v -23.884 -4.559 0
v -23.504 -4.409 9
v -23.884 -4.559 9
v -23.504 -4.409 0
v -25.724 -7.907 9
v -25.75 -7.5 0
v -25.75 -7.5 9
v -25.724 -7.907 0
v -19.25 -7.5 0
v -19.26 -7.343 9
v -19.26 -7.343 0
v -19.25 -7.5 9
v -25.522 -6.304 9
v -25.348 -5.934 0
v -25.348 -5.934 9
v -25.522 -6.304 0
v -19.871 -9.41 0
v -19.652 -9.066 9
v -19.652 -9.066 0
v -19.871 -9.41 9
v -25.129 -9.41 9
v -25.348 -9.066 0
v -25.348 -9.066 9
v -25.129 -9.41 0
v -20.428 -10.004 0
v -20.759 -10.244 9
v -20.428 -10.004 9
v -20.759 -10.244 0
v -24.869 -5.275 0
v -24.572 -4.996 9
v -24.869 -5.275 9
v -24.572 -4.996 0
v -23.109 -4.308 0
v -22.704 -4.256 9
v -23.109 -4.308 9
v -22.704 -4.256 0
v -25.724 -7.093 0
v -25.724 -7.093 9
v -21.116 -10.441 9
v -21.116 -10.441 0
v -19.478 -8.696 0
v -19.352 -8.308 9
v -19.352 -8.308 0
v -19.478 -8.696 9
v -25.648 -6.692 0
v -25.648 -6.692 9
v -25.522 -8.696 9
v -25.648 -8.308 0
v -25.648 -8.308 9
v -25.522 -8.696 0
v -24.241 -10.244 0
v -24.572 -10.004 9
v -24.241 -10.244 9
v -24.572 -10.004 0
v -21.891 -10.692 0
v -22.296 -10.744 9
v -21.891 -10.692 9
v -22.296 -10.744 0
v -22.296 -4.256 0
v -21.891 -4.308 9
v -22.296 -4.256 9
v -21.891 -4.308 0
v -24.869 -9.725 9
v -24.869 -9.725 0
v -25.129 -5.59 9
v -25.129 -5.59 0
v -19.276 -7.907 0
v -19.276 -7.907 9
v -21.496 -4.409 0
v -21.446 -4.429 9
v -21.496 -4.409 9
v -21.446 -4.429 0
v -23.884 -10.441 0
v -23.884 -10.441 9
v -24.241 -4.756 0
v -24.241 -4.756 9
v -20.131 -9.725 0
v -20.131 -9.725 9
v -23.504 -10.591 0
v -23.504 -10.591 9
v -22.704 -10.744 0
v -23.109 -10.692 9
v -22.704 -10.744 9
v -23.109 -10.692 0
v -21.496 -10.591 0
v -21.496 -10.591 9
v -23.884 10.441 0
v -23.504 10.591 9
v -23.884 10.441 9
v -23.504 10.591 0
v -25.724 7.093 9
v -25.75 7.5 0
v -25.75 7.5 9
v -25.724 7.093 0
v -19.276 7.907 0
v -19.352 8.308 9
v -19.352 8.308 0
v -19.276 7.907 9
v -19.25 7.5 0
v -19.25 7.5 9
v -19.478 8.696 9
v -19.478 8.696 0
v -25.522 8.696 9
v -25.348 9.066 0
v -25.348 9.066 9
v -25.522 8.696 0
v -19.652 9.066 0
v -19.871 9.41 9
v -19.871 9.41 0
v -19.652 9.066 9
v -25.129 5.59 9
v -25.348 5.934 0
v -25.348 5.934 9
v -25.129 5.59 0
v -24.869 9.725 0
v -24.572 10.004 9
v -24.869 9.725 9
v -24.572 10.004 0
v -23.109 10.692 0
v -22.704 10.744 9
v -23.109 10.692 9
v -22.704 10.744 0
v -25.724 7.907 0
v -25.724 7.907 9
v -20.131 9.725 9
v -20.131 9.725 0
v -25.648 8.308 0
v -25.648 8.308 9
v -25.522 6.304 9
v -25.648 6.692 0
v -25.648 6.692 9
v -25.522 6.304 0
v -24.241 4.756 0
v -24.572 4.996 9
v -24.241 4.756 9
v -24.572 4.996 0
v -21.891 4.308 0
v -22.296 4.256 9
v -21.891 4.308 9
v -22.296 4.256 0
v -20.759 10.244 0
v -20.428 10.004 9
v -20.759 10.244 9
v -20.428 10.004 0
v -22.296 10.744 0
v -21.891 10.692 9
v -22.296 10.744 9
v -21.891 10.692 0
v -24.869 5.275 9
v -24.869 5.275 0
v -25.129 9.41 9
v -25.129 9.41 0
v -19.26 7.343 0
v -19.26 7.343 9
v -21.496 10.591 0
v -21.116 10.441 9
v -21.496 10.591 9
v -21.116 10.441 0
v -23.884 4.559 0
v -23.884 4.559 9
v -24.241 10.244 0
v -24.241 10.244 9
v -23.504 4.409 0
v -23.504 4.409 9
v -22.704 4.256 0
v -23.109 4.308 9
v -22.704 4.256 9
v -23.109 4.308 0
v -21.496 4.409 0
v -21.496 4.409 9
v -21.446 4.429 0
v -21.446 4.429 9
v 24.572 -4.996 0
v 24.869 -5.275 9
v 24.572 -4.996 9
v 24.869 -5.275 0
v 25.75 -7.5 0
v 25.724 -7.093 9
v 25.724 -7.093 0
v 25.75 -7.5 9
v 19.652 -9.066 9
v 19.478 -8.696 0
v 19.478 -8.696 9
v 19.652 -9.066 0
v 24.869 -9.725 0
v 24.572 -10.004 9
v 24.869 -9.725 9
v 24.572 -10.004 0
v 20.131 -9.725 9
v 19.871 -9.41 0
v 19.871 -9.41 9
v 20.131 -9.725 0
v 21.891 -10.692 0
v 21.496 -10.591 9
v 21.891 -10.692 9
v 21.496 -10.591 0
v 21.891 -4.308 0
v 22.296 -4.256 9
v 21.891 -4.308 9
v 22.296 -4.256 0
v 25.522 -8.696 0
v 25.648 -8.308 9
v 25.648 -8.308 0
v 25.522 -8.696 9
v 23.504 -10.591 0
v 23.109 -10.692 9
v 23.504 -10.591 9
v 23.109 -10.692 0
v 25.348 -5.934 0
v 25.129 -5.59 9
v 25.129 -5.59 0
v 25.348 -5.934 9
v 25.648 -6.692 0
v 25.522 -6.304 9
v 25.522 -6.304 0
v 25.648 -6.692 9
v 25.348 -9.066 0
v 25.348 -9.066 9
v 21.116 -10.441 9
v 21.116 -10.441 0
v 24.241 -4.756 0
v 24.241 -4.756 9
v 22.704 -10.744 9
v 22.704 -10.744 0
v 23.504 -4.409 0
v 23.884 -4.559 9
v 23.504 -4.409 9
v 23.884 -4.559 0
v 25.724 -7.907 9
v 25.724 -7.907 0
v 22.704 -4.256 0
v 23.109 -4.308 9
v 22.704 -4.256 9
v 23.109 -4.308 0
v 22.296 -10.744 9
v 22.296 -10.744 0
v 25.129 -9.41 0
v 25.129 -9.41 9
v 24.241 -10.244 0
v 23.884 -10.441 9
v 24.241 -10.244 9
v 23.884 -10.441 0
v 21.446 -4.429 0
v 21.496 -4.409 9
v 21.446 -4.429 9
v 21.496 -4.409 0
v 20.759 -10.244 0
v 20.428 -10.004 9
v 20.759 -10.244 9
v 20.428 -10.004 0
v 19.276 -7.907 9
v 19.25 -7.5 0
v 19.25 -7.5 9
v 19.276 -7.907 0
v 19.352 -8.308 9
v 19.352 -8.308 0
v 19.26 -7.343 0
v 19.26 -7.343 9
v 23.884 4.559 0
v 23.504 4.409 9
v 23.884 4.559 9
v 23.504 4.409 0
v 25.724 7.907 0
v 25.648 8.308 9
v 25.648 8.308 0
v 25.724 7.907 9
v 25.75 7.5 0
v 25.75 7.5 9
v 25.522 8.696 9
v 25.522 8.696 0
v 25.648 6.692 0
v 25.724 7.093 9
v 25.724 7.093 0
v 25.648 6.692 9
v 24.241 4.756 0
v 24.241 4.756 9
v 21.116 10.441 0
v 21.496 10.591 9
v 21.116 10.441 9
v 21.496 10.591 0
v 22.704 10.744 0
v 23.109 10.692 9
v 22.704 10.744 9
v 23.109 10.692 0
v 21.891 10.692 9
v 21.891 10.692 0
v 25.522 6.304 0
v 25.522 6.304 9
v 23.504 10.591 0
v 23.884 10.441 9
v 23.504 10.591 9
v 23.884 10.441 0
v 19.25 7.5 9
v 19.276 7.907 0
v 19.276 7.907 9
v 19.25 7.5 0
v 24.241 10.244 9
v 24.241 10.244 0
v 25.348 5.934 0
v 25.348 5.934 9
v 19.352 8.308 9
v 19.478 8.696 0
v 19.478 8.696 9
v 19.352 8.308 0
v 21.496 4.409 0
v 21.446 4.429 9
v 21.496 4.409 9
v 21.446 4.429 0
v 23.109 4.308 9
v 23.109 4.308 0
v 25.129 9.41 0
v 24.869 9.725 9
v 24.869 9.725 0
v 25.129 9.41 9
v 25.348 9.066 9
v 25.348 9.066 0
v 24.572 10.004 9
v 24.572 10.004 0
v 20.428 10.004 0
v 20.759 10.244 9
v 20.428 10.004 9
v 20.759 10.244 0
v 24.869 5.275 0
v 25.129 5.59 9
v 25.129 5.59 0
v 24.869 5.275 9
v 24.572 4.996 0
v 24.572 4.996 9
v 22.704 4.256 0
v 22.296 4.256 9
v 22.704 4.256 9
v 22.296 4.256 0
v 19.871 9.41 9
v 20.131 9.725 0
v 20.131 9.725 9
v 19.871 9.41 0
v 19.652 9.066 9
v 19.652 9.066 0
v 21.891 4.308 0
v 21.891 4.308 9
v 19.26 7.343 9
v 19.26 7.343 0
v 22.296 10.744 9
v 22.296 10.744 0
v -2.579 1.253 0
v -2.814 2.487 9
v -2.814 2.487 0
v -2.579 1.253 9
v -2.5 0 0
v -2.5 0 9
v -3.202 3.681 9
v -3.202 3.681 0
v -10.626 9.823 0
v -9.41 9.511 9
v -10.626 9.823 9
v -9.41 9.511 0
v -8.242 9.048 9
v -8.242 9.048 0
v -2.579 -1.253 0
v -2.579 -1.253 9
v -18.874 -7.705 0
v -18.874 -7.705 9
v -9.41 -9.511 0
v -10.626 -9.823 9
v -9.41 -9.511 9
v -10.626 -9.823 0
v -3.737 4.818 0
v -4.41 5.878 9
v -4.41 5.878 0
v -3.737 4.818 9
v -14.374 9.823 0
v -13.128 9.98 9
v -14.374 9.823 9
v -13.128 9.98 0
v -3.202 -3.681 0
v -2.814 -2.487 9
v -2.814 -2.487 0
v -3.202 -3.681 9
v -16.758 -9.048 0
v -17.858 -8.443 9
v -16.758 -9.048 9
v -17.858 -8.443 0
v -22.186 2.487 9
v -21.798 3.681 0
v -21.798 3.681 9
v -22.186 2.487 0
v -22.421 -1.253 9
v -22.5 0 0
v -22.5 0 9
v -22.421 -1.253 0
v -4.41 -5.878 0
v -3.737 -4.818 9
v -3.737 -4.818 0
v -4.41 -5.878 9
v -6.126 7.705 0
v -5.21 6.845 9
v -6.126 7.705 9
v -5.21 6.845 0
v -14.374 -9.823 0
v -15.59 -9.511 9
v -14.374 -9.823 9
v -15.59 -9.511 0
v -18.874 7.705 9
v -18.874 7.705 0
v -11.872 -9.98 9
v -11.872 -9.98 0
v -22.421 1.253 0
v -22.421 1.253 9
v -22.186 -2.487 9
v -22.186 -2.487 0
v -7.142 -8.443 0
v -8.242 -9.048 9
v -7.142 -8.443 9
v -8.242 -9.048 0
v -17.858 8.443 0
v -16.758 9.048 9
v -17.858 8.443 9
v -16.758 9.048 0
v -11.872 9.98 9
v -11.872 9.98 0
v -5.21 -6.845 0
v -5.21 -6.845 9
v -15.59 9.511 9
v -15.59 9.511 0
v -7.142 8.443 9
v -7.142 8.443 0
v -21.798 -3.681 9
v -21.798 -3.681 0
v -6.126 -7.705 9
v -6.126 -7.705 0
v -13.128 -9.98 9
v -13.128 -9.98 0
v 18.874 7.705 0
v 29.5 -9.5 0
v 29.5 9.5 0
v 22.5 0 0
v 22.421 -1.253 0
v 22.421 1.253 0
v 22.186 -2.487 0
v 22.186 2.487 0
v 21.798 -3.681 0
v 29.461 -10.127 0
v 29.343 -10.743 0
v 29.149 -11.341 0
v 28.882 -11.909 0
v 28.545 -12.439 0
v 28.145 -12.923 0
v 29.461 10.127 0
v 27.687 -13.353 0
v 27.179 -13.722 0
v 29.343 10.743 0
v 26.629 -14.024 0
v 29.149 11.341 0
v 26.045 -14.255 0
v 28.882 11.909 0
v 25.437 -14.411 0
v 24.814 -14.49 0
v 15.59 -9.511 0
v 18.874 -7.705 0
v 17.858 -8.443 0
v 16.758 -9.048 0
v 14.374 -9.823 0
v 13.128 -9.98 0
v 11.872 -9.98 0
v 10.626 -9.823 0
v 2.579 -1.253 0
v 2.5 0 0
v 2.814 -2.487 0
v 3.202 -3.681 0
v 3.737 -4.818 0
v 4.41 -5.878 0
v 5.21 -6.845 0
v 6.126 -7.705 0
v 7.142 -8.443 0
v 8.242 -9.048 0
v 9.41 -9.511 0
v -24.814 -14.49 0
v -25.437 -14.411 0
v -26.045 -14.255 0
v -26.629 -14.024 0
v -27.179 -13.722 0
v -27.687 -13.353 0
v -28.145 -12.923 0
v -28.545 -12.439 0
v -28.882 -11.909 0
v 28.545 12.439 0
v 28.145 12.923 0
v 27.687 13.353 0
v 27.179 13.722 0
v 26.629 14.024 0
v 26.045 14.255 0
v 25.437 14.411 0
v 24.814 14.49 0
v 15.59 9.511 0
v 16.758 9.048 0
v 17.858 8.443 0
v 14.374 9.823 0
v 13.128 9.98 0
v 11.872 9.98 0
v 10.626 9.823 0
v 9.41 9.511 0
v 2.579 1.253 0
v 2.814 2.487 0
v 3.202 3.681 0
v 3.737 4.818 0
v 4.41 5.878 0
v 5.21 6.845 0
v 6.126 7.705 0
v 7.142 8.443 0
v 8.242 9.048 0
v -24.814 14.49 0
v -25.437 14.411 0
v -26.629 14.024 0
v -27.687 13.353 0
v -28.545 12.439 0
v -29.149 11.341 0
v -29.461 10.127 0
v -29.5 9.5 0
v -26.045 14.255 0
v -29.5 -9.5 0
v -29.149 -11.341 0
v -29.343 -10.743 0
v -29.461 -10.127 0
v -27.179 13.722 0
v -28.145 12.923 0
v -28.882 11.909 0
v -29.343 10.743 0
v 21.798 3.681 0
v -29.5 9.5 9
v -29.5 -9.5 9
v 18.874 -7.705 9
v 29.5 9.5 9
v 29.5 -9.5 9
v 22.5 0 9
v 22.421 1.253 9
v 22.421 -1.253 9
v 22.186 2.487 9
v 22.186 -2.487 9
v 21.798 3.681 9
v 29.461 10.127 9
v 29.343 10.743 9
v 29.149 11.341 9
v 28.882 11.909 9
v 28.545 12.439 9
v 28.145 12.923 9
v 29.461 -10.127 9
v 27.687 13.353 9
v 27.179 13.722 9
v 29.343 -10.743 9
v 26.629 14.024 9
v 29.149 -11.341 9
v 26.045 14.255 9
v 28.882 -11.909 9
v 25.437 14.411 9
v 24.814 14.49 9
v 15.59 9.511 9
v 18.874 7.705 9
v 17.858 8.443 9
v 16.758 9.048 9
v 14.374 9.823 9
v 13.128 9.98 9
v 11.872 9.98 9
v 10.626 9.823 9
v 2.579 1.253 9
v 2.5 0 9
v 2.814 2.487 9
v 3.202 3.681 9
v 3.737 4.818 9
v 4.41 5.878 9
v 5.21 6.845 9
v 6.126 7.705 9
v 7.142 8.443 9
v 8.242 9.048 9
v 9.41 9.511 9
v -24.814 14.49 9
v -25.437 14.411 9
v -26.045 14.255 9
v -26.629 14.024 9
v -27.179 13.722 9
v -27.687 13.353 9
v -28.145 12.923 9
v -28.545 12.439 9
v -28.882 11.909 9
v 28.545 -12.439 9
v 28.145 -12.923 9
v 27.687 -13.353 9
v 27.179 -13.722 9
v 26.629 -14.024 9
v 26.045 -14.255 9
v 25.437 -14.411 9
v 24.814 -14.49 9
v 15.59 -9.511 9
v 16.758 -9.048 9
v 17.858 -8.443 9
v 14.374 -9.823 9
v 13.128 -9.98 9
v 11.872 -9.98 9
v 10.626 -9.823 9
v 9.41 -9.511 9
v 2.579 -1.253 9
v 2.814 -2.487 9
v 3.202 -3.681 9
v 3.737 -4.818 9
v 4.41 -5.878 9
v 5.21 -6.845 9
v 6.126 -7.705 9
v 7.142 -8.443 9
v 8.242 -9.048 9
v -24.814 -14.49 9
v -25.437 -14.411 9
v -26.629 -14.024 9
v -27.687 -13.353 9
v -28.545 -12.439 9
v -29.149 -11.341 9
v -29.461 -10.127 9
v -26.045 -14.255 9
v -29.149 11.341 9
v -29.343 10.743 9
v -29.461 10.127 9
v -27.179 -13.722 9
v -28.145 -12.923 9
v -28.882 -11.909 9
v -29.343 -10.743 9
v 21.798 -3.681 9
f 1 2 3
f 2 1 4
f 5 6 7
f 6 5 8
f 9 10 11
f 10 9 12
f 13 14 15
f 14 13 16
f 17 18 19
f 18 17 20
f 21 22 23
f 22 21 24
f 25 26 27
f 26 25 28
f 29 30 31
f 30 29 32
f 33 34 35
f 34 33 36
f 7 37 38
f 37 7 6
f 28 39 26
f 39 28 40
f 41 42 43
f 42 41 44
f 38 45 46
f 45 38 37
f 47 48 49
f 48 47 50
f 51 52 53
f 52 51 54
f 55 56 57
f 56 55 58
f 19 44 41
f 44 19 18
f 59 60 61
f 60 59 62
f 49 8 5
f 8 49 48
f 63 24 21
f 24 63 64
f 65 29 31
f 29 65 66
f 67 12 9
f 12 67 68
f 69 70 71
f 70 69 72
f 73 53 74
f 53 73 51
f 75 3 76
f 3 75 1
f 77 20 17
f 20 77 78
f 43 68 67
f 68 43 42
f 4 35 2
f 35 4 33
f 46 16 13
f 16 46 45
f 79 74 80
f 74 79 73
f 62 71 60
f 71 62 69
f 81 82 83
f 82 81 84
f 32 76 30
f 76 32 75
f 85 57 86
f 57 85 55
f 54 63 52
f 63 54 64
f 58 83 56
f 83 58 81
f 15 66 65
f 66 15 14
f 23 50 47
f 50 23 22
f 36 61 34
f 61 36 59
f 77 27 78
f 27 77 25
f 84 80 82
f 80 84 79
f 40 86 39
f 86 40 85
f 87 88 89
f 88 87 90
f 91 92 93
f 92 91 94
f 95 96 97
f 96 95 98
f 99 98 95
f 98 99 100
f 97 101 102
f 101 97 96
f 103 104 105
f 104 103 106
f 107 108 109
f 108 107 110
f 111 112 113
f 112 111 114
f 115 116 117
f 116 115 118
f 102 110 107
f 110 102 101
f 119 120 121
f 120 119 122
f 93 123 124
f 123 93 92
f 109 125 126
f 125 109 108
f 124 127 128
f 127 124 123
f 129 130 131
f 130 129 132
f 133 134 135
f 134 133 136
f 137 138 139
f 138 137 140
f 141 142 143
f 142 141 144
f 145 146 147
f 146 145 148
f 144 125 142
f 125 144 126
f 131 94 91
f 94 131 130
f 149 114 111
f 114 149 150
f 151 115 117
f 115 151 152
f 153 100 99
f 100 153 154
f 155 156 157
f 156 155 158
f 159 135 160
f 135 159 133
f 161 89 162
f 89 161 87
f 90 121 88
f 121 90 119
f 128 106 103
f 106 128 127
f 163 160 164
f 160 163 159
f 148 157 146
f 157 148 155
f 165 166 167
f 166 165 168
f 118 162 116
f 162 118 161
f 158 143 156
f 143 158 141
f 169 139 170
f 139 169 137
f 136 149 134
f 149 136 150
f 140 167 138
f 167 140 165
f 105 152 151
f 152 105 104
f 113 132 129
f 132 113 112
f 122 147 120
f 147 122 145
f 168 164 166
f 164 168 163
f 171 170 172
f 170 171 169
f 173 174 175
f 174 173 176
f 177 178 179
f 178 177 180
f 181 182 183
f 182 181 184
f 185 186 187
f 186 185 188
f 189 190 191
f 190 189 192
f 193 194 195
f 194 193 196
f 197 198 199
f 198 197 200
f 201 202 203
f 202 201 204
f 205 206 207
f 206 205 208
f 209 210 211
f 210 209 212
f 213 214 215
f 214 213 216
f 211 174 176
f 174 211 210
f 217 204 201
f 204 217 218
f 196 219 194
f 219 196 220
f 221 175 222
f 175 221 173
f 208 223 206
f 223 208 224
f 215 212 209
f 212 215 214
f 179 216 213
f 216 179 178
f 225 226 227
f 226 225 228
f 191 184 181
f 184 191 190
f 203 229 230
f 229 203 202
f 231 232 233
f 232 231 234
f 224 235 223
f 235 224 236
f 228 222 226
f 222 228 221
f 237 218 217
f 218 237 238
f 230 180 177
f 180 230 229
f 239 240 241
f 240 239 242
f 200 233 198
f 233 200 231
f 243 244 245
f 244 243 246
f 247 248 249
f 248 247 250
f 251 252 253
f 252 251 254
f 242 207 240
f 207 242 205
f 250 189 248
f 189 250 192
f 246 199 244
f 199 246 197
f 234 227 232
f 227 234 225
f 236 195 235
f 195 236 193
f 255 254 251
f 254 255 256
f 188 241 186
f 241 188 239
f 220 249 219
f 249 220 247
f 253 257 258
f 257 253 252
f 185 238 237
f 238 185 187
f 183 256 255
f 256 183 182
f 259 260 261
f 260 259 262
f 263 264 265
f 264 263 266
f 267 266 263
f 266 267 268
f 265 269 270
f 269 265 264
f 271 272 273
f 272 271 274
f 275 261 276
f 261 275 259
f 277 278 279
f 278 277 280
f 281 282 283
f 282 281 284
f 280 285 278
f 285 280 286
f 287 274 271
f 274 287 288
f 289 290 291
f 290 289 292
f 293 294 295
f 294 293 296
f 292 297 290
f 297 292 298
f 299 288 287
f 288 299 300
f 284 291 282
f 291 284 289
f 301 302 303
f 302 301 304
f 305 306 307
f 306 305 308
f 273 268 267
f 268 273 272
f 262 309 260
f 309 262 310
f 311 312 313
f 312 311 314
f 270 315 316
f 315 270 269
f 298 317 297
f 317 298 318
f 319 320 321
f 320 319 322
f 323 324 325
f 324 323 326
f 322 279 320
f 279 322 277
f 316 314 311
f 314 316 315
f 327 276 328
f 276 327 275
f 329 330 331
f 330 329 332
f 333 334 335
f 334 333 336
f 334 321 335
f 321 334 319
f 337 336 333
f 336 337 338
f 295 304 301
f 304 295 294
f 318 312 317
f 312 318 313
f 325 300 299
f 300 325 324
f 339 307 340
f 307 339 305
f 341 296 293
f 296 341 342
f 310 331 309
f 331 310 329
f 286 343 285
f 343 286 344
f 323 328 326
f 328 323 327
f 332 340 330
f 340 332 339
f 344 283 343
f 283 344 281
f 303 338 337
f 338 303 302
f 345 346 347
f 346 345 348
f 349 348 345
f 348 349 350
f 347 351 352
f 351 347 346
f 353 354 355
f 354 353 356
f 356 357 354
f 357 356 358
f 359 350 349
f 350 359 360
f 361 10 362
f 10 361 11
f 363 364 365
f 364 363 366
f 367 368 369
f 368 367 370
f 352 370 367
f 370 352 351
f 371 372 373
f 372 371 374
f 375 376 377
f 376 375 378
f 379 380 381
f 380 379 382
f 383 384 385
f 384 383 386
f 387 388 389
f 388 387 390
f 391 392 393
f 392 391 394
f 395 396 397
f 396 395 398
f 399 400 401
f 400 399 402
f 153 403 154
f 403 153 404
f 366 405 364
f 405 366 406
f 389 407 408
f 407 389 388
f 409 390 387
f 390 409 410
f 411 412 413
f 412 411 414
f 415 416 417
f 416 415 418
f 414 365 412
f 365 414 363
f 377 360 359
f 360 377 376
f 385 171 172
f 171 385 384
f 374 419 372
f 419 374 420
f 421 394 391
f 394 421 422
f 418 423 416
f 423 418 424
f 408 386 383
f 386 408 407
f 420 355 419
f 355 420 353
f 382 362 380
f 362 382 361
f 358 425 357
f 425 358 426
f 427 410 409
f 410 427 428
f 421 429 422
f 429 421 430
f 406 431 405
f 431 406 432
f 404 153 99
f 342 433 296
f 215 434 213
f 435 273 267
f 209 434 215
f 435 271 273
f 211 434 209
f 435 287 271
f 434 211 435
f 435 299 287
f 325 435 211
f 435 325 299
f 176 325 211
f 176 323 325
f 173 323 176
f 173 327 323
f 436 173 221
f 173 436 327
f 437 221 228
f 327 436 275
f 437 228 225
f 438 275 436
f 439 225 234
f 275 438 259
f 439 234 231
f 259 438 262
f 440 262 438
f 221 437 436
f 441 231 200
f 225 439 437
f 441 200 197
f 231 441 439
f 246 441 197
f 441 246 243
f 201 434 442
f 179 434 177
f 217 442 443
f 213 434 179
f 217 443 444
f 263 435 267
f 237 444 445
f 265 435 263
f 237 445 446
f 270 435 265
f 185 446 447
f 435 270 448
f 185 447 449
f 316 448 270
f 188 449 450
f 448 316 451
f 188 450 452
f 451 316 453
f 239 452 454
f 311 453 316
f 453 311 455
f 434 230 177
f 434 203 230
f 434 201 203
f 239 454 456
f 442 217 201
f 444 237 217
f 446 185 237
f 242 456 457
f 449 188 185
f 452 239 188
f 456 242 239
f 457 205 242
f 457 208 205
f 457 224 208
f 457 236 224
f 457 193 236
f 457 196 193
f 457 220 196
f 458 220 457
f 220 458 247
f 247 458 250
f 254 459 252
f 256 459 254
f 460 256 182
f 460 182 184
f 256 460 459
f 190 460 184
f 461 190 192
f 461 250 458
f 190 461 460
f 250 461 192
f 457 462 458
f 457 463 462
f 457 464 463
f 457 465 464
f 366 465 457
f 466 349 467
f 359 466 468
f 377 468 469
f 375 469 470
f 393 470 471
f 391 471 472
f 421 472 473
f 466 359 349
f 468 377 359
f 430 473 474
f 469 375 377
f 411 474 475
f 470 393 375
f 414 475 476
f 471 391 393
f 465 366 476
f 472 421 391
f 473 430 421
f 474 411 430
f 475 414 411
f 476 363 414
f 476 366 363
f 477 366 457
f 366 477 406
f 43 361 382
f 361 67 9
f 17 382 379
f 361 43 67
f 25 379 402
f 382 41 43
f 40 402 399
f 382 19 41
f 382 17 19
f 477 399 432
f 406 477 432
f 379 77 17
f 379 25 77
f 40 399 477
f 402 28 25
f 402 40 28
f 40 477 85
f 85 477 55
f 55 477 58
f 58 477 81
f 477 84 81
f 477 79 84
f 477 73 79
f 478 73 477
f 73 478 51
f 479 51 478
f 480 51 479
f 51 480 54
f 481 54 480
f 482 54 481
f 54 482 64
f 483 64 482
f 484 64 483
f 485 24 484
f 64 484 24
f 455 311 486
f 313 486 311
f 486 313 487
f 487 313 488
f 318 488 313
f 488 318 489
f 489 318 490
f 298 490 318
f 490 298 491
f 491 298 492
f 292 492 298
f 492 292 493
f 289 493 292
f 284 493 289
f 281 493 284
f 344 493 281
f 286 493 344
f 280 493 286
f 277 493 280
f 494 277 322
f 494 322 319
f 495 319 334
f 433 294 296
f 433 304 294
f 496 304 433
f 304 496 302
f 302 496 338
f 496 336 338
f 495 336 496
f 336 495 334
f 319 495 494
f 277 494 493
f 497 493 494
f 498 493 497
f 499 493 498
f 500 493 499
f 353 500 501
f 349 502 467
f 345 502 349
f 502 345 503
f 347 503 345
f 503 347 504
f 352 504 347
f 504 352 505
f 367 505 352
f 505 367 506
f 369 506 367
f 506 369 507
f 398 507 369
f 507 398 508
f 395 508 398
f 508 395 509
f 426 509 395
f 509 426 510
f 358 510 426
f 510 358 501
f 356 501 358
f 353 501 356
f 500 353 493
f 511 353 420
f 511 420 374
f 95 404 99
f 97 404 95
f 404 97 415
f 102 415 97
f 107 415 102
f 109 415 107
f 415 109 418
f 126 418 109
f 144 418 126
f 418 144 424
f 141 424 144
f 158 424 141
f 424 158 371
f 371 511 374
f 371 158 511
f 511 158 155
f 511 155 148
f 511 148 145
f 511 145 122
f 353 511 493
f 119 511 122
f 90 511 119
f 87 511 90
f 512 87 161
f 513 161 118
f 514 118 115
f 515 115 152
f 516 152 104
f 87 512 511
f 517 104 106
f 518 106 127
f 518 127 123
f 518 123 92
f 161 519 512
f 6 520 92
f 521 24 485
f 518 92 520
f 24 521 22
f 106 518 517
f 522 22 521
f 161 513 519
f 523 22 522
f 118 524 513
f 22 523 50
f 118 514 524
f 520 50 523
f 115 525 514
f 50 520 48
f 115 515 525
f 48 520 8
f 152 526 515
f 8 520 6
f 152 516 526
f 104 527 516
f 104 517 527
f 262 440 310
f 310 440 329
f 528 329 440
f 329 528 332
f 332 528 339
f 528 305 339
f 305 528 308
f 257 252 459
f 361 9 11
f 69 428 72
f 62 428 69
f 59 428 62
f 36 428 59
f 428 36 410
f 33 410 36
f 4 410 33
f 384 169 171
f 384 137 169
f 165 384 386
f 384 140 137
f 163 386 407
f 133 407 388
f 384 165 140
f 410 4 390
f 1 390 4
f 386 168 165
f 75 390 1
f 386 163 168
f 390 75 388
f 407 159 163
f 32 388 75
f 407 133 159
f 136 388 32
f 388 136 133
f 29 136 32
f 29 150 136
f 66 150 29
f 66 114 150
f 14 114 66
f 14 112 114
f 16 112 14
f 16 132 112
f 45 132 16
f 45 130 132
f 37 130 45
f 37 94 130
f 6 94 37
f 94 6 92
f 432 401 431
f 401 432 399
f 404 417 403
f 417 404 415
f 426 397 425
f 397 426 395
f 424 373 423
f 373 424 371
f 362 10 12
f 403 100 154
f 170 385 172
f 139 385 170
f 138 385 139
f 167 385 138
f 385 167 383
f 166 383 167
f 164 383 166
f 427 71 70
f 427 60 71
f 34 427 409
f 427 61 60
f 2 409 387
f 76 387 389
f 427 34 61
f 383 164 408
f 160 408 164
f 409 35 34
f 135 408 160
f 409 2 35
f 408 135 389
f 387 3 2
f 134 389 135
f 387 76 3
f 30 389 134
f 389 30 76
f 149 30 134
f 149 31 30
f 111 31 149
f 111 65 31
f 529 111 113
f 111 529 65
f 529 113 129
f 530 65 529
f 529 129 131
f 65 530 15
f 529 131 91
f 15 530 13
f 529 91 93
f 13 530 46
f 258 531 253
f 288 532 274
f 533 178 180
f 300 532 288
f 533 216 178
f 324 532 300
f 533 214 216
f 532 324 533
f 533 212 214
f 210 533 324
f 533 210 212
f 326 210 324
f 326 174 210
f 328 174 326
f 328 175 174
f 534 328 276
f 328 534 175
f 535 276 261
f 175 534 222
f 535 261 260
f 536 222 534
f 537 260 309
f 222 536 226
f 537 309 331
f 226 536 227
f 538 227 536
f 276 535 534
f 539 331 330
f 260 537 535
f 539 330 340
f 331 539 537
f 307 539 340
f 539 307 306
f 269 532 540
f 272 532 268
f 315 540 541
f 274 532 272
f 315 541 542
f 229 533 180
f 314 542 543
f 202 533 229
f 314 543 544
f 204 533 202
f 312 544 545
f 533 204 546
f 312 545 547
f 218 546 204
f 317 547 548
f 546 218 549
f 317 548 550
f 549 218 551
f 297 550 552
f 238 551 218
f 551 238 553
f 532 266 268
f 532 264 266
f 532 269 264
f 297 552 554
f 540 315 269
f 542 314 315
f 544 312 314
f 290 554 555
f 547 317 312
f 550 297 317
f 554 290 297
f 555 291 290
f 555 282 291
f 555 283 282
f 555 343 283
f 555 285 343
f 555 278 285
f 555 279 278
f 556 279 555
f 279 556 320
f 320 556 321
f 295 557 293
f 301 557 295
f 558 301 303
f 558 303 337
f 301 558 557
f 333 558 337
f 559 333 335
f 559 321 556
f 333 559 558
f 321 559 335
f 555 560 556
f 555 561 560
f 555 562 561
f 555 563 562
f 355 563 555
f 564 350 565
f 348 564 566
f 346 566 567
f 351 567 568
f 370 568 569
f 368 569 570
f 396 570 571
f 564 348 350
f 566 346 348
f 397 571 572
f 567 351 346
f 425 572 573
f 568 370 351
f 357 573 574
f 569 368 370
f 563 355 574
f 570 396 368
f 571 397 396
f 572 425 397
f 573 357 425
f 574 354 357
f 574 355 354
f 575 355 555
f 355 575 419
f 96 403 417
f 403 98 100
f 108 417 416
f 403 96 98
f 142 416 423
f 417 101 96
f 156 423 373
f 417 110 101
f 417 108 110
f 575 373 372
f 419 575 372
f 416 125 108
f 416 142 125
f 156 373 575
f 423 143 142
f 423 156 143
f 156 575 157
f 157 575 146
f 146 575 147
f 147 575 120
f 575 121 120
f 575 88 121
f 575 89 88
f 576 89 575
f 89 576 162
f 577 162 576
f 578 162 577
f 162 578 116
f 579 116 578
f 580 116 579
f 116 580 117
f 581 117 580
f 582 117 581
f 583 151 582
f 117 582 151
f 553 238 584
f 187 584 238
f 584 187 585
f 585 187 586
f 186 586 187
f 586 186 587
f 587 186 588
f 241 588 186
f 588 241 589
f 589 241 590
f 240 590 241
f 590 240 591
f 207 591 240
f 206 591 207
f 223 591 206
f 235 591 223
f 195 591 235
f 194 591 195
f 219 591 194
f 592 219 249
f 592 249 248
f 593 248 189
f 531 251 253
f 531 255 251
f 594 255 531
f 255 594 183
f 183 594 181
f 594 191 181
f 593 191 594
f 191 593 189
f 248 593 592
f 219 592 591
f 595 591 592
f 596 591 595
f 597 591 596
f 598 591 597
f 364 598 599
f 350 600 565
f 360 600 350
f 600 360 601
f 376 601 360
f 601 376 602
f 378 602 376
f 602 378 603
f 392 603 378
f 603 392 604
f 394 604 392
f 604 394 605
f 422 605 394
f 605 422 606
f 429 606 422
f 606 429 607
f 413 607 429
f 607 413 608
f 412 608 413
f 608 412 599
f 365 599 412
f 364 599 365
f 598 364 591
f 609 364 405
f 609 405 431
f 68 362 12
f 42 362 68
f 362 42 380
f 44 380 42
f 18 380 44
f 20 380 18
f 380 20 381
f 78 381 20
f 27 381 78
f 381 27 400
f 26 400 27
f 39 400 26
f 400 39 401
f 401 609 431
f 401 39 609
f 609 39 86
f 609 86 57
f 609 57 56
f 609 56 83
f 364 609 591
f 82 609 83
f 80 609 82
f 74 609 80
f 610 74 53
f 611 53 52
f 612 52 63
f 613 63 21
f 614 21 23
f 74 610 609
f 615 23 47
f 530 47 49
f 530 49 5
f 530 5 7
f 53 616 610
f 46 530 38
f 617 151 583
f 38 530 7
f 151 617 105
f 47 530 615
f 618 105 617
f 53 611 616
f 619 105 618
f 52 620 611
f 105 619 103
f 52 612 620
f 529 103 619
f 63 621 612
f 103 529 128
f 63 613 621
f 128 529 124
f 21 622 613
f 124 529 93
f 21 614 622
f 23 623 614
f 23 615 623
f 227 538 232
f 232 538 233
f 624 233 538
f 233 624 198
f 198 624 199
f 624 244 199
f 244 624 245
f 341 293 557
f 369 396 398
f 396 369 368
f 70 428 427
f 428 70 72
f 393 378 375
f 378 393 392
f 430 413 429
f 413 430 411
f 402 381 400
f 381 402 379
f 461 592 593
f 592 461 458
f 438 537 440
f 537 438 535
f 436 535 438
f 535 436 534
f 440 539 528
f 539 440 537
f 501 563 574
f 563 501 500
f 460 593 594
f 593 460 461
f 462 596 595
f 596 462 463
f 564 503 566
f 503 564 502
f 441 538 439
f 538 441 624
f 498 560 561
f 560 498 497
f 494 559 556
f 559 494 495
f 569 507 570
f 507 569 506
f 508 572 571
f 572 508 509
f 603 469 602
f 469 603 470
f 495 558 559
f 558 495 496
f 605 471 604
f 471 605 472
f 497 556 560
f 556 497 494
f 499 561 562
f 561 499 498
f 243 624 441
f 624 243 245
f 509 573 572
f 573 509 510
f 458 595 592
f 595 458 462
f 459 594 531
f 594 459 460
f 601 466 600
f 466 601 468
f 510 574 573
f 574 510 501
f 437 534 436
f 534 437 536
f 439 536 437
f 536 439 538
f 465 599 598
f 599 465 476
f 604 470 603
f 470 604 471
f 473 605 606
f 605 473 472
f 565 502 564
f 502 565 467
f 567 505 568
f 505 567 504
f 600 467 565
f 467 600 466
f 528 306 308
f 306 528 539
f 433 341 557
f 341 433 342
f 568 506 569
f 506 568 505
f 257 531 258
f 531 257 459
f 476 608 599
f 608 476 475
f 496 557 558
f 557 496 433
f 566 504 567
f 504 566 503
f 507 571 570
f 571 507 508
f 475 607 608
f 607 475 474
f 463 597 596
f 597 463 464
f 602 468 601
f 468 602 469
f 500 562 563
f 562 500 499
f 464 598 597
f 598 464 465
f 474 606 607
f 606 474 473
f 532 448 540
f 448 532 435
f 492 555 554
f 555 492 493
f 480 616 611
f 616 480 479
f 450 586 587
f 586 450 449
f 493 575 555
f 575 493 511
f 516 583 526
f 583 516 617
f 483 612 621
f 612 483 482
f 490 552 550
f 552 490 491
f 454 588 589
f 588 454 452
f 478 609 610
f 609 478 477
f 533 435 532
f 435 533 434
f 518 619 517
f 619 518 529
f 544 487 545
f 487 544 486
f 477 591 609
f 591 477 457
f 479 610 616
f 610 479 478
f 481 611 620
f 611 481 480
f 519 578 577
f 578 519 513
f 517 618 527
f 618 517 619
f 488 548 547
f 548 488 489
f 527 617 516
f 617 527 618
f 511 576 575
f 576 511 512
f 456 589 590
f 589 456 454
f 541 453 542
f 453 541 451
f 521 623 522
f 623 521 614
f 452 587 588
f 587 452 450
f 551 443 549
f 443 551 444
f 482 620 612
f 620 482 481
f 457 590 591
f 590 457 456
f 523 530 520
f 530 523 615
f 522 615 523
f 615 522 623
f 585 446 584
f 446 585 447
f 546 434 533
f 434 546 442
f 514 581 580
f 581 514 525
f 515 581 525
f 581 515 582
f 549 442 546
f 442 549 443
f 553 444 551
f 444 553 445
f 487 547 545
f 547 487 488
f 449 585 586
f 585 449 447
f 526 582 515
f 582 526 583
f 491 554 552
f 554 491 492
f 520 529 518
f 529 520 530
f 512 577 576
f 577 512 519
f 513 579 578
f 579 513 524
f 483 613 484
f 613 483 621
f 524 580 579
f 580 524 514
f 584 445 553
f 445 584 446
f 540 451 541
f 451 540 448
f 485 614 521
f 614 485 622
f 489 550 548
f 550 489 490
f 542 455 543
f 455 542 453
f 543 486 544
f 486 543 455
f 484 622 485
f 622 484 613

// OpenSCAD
$fn = 50;


difference() {
	union() {
		hull() {
			translate(v = [-24.5000000000, 9.5000000000, 0]) {
				cylinder(h = 9, r = 5);
			}
			translate(v = [24.5000000000, 9.5000000000, 0]) {
				cylinder(h = 9, r = 5);
			}
			translate(v = [-24.5000000000, -9.5000000000, 0]) {
				cylinder(h = 9, r = 5);
			}
			translate(v = [24.5000000000, -9.5000000000, 0]) {
				cylinder(h = 9, r = 5);
			}
		}
	}
	union() {
		#translate(v = [-22.5000000000, -7.5000000000, -100.0000000000]) {
			cylinder(h = 200, r = 3.2500000000);
		}
		#translate(v = [-22.5000000000, 7.5000000000, -100.0000000000]) {
			cylinder(h = 200, r = 3.2500000000);
		}
		#translate(v = [22.5000000000, -7.5000000000, -100.0000000000]) {
			cylinder(h = 200, r = 3.2500000000);
		}
		#translate(v = [22.5000000000, 7.5000000000, -100.0000000000]) {
			cylinder(h = 200, r = 3.2500000000);
		}
		#translate(v = [-12.5000000000, 0, 0]) {
			cylinder(h = 9, r = 10.0000000000);
		}
		#translate(v = [12.5000000000, 0, 0]) {
			cylinder(h = 9, r = 10.0000000000);
		}
	}
}
